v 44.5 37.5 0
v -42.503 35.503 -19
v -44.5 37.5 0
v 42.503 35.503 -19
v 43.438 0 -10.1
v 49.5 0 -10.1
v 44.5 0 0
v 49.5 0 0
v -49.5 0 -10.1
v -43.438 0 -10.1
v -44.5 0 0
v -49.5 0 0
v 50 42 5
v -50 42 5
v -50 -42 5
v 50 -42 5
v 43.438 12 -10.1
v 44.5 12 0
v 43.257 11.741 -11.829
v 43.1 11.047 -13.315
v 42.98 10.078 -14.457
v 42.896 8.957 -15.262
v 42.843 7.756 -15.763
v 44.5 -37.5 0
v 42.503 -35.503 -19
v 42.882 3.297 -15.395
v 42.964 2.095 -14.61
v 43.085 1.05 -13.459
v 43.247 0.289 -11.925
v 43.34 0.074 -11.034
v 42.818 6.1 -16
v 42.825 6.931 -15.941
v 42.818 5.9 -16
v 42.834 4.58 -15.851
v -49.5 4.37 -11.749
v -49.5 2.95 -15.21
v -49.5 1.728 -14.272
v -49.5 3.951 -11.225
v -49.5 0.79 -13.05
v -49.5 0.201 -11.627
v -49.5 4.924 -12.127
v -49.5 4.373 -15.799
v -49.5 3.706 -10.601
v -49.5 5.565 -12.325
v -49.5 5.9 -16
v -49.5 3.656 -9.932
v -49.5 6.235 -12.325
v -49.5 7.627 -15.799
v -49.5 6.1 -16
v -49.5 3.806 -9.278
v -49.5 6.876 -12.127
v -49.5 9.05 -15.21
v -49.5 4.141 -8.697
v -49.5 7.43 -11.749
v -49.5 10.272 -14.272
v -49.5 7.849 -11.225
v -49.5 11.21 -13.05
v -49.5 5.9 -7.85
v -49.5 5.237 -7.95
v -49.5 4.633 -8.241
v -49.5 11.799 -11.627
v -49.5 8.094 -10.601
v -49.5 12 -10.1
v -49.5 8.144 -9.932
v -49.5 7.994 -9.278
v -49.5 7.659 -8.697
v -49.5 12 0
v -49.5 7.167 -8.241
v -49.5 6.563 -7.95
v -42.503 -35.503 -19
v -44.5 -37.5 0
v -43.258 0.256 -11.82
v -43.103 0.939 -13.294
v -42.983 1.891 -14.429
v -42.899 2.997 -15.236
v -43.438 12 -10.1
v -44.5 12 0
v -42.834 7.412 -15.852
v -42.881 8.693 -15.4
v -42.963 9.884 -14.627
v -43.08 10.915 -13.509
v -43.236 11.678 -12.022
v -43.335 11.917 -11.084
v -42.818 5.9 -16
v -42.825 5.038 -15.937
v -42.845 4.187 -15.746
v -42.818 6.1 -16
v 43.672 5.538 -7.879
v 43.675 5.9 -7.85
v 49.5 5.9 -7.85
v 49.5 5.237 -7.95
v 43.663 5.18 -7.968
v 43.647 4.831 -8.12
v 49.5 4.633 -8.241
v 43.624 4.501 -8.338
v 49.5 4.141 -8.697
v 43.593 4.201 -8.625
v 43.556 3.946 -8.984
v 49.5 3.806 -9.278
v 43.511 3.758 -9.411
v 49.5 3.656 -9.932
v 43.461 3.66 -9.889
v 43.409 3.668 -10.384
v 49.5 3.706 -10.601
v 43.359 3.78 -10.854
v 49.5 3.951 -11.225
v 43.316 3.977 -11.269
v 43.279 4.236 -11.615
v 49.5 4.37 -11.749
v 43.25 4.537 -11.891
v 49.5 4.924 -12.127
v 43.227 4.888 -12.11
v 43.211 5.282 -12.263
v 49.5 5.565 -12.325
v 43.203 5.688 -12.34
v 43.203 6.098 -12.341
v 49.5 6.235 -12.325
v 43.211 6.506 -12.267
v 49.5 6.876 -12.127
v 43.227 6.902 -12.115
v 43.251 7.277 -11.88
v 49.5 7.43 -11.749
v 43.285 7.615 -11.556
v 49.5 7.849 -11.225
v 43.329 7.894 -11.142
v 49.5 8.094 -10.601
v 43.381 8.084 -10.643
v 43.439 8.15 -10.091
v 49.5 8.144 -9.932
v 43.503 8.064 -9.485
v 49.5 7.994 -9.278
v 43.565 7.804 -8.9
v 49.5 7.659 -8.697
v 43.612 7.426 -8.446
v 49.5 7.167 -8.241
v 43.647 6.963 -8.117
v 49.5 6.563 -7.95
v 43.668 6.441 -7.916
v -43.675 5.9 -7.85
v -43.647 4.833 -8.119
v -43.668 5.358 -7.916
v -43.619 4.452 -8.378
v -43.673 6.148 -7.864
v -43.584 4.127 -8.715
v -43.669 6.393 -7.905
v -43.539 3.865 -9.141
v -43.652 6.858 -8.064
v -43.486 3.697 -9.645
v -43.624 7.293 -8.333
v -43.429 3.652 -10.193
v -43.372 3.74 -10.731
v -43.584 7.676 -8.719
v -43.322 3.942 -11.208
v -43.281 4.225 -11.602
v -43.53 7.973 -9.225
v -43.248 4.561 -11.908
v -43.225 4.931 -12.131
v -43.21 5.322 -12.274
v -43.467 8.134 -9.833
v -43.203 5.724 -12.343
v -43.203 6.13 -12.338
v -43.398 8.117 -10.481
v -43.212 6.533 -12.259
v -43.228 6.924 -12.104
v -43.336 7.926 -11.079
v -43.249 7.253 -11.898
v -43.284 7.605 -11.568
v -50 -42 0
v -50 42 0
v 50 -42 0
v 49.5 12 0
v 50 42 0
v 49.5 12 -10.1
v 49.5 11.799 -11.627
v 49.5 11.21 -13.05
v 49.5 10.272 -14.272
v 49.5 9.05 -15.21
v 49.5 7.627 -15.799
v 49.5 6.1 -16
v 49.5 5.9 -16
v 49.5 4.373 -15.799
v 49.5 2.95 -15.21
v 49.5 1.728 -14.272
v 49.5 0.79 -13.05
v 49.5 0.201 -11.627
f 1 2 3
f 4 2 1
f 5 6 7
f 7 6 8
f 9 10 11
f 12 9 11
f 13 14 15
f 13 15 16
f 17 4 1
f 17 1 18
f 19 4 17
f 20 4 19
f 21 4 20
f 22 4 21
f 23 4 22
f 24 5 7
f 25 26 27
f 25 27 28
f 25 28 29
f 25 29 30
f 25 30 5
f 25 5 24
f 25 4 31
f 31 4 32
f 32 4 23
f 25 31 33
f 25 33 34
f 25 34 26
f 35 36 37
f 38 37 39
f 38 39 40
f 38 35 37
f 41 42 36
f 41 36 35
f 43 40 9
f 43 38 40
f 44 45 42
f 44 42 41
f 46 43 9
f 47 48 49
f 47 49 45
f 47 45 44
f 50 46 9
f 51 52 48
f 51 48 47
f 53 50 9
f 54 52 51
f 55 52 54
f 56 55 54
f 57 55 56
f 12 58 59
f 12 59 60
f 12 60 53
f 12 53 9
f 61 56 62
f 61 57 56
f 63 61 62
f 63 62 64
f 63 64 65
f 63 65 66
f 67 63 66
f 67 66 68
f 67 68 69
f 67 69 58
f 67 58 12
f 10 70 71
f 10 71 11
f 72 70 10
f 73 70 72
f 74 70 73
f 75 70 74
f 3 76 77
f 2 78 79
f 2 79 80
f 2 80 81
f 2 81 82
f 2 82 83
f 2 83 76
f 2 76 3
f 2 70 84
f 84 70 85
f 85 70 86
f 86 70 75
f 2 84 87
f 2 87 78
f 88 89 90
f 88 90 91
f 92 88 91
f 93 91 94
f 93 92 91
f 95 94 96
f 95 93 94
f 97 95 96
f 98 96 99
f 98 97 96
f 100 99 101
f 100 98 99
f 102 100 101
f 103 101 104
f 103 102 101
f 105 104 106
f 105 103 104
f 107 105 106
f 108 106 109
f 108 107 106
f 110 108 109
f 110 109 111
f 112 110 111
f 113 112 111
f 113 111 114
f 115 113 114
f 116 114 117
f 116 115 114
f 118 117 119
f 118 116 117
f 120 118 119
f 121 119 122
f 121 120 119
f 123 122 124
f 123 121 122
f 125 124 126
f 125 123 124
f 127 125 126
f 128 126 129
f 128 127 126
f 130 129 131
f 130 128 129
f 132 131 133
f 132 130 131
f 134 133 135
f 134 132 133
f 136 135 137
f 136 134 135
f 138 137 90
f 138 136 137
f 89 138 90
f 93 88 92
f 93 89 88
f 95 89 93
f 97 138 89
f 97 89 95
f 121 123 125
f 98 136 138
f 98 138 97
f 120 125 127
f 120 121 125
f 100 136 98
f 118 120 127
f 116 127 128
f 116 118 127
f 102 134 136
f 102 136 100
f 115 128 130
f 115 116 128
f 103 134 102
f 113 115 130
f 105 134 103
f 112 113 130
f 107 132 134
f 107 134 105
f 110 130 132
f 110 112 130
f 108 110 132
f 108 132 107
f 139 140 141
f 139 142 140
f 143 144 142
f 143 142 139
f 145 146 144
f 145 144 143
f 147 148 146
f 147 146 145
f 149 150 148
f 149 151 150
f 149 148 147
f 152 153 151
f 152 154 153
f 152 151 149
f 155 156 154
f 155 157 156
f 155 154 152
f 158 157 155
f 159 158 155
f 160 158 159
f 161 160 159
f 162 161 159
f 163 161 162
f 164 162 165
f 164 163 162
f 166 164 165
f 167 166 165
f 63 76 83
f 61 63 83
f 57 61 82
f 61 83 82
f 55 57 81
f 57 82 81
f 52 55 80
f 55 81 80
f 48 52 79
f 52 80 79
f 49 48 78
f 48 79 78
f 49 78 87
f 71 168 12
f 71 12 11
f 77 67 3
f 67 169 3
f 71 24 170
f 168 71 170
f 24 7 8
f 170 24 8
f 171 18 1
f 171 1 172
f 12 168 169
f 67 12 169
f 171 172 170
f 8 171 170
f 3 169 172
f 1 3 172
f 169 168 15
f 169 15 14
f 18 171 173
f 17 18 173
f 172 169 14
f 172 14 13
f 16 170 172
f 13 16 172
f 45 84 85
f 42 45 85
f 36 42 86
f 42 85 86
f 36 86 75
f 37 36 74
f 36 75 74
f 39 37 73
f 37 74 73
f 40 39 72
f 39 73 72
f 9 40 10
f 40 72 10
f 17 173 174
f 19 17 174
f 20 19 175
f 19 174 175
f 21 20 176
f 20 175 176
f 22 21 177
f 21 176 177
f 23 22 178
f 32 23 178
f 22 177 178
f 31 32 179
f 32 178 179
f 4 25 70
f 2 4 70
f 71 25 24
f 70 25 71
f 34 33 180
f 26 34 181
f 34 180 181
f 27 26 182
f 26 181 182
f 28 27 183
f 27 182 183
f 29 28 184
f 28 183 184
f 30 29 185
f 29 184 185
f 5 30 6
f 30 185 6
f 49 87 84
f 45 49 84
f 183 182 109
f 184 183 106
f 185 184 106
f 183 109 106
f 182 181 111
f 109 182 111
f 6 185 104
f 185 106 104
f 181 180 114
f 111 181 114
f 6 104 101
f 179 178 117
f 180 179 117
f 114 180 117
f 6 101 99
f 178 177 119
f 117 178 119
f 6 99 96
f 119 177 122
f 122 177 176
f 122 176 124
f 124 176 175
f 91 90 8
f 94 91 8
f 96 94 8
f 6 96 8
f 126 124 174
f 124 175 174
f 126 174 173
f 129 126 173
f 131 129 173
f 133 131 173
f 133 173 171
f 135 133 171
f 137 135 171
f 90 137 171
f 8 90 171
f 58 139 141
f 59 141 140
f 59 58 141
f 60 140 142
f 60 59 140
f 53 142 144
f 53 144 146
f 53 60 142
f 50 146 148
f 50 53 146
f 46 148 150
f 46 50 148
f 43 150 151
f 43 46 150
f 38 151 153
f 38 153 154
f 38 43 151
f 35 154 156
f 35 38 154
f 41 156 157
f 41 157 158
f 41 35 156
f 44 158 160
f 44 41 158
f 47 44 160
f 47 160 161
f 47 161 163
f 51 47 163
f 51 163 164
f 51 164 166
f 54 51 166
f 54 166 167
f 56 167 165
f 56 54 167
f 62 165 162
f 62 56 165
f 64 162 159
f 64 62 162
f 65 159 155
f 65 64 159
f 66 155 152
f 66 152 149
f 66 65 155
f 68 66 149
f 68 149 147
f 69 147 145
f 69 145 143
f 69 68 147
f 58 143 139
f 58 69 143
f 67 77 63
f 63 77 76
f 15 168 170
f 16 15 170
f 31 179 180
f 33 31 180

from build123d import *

# Parameters (mm, degrees)
CROQUIS1_W              = 100
CROQUIS1_H              = 84
SALIENTE_EXTRUIR1_DEPTH = 5
CROQUIS2_W              = 89
CROQUIS2_H              = 75
SALIENTE_EXTRUIR2_DEPTH = 19
SALIENTE_EXTRUIR2_TAPER = 6
CROQUIS3_R              = 2.25
SALIENTE_EXTRUIR3_DEPTH = 49.5


with BuildPart() as part:
    # Croquis1 → Saliente-Extruir1 (new body)
    with BuildSketch(Plane.XY):
        Rectangle(CROQUIS1_W, CROQUIS1_H)
    extrude(amount=SALIENTE_EXTRUIR1_DEPTH)

    # Croquis2 → Saliente-Extruir2 (add)
    with BuildSketch(Plane(origin=(0, 0, 0), x_dir=(-1, 0, 0), z_dir=(0, 0, -1))):
        Rectangle(CROQUIS2_W, CROQUIS2_H)
    extrude(amount=SALIENTE_EXTRUIR2_DEPTH, taper=SALIENTE_EXTRUIR2_TAPER)

    # Croquis3 → Saliente-Extruir3 (add, symmetric)
    with BuildSketch(Plane(origin=(0, 0, 0), x_dir=(0, 0, -1), z_dir=(1, 0, 0))):
        with BuildLine():
            Line((0, 12), (10.1, 12))
            ThreePointArc((10.1, 12), (14.271930009, 10.271930009), (16, 6.1))
            Line((16, 6.1), (16, 5.9))
            ThreePointArc((16, 5.9), (14.271930009, 1.728069991), (10.1, 0))
            Line((10.1, 0), (0, 0))
            Line((0, 0), (0, 12))
        make_face()
        with Locations(Location((10.1, 5.9, 0), (0, 0, 180))):
            Circle(CROQUIS3_R, mode=Mode.SUBTRACT)
    extrude(amount=SALIENTE_EXTRUIR3_DEPTH, both=True)


solid = part.part
